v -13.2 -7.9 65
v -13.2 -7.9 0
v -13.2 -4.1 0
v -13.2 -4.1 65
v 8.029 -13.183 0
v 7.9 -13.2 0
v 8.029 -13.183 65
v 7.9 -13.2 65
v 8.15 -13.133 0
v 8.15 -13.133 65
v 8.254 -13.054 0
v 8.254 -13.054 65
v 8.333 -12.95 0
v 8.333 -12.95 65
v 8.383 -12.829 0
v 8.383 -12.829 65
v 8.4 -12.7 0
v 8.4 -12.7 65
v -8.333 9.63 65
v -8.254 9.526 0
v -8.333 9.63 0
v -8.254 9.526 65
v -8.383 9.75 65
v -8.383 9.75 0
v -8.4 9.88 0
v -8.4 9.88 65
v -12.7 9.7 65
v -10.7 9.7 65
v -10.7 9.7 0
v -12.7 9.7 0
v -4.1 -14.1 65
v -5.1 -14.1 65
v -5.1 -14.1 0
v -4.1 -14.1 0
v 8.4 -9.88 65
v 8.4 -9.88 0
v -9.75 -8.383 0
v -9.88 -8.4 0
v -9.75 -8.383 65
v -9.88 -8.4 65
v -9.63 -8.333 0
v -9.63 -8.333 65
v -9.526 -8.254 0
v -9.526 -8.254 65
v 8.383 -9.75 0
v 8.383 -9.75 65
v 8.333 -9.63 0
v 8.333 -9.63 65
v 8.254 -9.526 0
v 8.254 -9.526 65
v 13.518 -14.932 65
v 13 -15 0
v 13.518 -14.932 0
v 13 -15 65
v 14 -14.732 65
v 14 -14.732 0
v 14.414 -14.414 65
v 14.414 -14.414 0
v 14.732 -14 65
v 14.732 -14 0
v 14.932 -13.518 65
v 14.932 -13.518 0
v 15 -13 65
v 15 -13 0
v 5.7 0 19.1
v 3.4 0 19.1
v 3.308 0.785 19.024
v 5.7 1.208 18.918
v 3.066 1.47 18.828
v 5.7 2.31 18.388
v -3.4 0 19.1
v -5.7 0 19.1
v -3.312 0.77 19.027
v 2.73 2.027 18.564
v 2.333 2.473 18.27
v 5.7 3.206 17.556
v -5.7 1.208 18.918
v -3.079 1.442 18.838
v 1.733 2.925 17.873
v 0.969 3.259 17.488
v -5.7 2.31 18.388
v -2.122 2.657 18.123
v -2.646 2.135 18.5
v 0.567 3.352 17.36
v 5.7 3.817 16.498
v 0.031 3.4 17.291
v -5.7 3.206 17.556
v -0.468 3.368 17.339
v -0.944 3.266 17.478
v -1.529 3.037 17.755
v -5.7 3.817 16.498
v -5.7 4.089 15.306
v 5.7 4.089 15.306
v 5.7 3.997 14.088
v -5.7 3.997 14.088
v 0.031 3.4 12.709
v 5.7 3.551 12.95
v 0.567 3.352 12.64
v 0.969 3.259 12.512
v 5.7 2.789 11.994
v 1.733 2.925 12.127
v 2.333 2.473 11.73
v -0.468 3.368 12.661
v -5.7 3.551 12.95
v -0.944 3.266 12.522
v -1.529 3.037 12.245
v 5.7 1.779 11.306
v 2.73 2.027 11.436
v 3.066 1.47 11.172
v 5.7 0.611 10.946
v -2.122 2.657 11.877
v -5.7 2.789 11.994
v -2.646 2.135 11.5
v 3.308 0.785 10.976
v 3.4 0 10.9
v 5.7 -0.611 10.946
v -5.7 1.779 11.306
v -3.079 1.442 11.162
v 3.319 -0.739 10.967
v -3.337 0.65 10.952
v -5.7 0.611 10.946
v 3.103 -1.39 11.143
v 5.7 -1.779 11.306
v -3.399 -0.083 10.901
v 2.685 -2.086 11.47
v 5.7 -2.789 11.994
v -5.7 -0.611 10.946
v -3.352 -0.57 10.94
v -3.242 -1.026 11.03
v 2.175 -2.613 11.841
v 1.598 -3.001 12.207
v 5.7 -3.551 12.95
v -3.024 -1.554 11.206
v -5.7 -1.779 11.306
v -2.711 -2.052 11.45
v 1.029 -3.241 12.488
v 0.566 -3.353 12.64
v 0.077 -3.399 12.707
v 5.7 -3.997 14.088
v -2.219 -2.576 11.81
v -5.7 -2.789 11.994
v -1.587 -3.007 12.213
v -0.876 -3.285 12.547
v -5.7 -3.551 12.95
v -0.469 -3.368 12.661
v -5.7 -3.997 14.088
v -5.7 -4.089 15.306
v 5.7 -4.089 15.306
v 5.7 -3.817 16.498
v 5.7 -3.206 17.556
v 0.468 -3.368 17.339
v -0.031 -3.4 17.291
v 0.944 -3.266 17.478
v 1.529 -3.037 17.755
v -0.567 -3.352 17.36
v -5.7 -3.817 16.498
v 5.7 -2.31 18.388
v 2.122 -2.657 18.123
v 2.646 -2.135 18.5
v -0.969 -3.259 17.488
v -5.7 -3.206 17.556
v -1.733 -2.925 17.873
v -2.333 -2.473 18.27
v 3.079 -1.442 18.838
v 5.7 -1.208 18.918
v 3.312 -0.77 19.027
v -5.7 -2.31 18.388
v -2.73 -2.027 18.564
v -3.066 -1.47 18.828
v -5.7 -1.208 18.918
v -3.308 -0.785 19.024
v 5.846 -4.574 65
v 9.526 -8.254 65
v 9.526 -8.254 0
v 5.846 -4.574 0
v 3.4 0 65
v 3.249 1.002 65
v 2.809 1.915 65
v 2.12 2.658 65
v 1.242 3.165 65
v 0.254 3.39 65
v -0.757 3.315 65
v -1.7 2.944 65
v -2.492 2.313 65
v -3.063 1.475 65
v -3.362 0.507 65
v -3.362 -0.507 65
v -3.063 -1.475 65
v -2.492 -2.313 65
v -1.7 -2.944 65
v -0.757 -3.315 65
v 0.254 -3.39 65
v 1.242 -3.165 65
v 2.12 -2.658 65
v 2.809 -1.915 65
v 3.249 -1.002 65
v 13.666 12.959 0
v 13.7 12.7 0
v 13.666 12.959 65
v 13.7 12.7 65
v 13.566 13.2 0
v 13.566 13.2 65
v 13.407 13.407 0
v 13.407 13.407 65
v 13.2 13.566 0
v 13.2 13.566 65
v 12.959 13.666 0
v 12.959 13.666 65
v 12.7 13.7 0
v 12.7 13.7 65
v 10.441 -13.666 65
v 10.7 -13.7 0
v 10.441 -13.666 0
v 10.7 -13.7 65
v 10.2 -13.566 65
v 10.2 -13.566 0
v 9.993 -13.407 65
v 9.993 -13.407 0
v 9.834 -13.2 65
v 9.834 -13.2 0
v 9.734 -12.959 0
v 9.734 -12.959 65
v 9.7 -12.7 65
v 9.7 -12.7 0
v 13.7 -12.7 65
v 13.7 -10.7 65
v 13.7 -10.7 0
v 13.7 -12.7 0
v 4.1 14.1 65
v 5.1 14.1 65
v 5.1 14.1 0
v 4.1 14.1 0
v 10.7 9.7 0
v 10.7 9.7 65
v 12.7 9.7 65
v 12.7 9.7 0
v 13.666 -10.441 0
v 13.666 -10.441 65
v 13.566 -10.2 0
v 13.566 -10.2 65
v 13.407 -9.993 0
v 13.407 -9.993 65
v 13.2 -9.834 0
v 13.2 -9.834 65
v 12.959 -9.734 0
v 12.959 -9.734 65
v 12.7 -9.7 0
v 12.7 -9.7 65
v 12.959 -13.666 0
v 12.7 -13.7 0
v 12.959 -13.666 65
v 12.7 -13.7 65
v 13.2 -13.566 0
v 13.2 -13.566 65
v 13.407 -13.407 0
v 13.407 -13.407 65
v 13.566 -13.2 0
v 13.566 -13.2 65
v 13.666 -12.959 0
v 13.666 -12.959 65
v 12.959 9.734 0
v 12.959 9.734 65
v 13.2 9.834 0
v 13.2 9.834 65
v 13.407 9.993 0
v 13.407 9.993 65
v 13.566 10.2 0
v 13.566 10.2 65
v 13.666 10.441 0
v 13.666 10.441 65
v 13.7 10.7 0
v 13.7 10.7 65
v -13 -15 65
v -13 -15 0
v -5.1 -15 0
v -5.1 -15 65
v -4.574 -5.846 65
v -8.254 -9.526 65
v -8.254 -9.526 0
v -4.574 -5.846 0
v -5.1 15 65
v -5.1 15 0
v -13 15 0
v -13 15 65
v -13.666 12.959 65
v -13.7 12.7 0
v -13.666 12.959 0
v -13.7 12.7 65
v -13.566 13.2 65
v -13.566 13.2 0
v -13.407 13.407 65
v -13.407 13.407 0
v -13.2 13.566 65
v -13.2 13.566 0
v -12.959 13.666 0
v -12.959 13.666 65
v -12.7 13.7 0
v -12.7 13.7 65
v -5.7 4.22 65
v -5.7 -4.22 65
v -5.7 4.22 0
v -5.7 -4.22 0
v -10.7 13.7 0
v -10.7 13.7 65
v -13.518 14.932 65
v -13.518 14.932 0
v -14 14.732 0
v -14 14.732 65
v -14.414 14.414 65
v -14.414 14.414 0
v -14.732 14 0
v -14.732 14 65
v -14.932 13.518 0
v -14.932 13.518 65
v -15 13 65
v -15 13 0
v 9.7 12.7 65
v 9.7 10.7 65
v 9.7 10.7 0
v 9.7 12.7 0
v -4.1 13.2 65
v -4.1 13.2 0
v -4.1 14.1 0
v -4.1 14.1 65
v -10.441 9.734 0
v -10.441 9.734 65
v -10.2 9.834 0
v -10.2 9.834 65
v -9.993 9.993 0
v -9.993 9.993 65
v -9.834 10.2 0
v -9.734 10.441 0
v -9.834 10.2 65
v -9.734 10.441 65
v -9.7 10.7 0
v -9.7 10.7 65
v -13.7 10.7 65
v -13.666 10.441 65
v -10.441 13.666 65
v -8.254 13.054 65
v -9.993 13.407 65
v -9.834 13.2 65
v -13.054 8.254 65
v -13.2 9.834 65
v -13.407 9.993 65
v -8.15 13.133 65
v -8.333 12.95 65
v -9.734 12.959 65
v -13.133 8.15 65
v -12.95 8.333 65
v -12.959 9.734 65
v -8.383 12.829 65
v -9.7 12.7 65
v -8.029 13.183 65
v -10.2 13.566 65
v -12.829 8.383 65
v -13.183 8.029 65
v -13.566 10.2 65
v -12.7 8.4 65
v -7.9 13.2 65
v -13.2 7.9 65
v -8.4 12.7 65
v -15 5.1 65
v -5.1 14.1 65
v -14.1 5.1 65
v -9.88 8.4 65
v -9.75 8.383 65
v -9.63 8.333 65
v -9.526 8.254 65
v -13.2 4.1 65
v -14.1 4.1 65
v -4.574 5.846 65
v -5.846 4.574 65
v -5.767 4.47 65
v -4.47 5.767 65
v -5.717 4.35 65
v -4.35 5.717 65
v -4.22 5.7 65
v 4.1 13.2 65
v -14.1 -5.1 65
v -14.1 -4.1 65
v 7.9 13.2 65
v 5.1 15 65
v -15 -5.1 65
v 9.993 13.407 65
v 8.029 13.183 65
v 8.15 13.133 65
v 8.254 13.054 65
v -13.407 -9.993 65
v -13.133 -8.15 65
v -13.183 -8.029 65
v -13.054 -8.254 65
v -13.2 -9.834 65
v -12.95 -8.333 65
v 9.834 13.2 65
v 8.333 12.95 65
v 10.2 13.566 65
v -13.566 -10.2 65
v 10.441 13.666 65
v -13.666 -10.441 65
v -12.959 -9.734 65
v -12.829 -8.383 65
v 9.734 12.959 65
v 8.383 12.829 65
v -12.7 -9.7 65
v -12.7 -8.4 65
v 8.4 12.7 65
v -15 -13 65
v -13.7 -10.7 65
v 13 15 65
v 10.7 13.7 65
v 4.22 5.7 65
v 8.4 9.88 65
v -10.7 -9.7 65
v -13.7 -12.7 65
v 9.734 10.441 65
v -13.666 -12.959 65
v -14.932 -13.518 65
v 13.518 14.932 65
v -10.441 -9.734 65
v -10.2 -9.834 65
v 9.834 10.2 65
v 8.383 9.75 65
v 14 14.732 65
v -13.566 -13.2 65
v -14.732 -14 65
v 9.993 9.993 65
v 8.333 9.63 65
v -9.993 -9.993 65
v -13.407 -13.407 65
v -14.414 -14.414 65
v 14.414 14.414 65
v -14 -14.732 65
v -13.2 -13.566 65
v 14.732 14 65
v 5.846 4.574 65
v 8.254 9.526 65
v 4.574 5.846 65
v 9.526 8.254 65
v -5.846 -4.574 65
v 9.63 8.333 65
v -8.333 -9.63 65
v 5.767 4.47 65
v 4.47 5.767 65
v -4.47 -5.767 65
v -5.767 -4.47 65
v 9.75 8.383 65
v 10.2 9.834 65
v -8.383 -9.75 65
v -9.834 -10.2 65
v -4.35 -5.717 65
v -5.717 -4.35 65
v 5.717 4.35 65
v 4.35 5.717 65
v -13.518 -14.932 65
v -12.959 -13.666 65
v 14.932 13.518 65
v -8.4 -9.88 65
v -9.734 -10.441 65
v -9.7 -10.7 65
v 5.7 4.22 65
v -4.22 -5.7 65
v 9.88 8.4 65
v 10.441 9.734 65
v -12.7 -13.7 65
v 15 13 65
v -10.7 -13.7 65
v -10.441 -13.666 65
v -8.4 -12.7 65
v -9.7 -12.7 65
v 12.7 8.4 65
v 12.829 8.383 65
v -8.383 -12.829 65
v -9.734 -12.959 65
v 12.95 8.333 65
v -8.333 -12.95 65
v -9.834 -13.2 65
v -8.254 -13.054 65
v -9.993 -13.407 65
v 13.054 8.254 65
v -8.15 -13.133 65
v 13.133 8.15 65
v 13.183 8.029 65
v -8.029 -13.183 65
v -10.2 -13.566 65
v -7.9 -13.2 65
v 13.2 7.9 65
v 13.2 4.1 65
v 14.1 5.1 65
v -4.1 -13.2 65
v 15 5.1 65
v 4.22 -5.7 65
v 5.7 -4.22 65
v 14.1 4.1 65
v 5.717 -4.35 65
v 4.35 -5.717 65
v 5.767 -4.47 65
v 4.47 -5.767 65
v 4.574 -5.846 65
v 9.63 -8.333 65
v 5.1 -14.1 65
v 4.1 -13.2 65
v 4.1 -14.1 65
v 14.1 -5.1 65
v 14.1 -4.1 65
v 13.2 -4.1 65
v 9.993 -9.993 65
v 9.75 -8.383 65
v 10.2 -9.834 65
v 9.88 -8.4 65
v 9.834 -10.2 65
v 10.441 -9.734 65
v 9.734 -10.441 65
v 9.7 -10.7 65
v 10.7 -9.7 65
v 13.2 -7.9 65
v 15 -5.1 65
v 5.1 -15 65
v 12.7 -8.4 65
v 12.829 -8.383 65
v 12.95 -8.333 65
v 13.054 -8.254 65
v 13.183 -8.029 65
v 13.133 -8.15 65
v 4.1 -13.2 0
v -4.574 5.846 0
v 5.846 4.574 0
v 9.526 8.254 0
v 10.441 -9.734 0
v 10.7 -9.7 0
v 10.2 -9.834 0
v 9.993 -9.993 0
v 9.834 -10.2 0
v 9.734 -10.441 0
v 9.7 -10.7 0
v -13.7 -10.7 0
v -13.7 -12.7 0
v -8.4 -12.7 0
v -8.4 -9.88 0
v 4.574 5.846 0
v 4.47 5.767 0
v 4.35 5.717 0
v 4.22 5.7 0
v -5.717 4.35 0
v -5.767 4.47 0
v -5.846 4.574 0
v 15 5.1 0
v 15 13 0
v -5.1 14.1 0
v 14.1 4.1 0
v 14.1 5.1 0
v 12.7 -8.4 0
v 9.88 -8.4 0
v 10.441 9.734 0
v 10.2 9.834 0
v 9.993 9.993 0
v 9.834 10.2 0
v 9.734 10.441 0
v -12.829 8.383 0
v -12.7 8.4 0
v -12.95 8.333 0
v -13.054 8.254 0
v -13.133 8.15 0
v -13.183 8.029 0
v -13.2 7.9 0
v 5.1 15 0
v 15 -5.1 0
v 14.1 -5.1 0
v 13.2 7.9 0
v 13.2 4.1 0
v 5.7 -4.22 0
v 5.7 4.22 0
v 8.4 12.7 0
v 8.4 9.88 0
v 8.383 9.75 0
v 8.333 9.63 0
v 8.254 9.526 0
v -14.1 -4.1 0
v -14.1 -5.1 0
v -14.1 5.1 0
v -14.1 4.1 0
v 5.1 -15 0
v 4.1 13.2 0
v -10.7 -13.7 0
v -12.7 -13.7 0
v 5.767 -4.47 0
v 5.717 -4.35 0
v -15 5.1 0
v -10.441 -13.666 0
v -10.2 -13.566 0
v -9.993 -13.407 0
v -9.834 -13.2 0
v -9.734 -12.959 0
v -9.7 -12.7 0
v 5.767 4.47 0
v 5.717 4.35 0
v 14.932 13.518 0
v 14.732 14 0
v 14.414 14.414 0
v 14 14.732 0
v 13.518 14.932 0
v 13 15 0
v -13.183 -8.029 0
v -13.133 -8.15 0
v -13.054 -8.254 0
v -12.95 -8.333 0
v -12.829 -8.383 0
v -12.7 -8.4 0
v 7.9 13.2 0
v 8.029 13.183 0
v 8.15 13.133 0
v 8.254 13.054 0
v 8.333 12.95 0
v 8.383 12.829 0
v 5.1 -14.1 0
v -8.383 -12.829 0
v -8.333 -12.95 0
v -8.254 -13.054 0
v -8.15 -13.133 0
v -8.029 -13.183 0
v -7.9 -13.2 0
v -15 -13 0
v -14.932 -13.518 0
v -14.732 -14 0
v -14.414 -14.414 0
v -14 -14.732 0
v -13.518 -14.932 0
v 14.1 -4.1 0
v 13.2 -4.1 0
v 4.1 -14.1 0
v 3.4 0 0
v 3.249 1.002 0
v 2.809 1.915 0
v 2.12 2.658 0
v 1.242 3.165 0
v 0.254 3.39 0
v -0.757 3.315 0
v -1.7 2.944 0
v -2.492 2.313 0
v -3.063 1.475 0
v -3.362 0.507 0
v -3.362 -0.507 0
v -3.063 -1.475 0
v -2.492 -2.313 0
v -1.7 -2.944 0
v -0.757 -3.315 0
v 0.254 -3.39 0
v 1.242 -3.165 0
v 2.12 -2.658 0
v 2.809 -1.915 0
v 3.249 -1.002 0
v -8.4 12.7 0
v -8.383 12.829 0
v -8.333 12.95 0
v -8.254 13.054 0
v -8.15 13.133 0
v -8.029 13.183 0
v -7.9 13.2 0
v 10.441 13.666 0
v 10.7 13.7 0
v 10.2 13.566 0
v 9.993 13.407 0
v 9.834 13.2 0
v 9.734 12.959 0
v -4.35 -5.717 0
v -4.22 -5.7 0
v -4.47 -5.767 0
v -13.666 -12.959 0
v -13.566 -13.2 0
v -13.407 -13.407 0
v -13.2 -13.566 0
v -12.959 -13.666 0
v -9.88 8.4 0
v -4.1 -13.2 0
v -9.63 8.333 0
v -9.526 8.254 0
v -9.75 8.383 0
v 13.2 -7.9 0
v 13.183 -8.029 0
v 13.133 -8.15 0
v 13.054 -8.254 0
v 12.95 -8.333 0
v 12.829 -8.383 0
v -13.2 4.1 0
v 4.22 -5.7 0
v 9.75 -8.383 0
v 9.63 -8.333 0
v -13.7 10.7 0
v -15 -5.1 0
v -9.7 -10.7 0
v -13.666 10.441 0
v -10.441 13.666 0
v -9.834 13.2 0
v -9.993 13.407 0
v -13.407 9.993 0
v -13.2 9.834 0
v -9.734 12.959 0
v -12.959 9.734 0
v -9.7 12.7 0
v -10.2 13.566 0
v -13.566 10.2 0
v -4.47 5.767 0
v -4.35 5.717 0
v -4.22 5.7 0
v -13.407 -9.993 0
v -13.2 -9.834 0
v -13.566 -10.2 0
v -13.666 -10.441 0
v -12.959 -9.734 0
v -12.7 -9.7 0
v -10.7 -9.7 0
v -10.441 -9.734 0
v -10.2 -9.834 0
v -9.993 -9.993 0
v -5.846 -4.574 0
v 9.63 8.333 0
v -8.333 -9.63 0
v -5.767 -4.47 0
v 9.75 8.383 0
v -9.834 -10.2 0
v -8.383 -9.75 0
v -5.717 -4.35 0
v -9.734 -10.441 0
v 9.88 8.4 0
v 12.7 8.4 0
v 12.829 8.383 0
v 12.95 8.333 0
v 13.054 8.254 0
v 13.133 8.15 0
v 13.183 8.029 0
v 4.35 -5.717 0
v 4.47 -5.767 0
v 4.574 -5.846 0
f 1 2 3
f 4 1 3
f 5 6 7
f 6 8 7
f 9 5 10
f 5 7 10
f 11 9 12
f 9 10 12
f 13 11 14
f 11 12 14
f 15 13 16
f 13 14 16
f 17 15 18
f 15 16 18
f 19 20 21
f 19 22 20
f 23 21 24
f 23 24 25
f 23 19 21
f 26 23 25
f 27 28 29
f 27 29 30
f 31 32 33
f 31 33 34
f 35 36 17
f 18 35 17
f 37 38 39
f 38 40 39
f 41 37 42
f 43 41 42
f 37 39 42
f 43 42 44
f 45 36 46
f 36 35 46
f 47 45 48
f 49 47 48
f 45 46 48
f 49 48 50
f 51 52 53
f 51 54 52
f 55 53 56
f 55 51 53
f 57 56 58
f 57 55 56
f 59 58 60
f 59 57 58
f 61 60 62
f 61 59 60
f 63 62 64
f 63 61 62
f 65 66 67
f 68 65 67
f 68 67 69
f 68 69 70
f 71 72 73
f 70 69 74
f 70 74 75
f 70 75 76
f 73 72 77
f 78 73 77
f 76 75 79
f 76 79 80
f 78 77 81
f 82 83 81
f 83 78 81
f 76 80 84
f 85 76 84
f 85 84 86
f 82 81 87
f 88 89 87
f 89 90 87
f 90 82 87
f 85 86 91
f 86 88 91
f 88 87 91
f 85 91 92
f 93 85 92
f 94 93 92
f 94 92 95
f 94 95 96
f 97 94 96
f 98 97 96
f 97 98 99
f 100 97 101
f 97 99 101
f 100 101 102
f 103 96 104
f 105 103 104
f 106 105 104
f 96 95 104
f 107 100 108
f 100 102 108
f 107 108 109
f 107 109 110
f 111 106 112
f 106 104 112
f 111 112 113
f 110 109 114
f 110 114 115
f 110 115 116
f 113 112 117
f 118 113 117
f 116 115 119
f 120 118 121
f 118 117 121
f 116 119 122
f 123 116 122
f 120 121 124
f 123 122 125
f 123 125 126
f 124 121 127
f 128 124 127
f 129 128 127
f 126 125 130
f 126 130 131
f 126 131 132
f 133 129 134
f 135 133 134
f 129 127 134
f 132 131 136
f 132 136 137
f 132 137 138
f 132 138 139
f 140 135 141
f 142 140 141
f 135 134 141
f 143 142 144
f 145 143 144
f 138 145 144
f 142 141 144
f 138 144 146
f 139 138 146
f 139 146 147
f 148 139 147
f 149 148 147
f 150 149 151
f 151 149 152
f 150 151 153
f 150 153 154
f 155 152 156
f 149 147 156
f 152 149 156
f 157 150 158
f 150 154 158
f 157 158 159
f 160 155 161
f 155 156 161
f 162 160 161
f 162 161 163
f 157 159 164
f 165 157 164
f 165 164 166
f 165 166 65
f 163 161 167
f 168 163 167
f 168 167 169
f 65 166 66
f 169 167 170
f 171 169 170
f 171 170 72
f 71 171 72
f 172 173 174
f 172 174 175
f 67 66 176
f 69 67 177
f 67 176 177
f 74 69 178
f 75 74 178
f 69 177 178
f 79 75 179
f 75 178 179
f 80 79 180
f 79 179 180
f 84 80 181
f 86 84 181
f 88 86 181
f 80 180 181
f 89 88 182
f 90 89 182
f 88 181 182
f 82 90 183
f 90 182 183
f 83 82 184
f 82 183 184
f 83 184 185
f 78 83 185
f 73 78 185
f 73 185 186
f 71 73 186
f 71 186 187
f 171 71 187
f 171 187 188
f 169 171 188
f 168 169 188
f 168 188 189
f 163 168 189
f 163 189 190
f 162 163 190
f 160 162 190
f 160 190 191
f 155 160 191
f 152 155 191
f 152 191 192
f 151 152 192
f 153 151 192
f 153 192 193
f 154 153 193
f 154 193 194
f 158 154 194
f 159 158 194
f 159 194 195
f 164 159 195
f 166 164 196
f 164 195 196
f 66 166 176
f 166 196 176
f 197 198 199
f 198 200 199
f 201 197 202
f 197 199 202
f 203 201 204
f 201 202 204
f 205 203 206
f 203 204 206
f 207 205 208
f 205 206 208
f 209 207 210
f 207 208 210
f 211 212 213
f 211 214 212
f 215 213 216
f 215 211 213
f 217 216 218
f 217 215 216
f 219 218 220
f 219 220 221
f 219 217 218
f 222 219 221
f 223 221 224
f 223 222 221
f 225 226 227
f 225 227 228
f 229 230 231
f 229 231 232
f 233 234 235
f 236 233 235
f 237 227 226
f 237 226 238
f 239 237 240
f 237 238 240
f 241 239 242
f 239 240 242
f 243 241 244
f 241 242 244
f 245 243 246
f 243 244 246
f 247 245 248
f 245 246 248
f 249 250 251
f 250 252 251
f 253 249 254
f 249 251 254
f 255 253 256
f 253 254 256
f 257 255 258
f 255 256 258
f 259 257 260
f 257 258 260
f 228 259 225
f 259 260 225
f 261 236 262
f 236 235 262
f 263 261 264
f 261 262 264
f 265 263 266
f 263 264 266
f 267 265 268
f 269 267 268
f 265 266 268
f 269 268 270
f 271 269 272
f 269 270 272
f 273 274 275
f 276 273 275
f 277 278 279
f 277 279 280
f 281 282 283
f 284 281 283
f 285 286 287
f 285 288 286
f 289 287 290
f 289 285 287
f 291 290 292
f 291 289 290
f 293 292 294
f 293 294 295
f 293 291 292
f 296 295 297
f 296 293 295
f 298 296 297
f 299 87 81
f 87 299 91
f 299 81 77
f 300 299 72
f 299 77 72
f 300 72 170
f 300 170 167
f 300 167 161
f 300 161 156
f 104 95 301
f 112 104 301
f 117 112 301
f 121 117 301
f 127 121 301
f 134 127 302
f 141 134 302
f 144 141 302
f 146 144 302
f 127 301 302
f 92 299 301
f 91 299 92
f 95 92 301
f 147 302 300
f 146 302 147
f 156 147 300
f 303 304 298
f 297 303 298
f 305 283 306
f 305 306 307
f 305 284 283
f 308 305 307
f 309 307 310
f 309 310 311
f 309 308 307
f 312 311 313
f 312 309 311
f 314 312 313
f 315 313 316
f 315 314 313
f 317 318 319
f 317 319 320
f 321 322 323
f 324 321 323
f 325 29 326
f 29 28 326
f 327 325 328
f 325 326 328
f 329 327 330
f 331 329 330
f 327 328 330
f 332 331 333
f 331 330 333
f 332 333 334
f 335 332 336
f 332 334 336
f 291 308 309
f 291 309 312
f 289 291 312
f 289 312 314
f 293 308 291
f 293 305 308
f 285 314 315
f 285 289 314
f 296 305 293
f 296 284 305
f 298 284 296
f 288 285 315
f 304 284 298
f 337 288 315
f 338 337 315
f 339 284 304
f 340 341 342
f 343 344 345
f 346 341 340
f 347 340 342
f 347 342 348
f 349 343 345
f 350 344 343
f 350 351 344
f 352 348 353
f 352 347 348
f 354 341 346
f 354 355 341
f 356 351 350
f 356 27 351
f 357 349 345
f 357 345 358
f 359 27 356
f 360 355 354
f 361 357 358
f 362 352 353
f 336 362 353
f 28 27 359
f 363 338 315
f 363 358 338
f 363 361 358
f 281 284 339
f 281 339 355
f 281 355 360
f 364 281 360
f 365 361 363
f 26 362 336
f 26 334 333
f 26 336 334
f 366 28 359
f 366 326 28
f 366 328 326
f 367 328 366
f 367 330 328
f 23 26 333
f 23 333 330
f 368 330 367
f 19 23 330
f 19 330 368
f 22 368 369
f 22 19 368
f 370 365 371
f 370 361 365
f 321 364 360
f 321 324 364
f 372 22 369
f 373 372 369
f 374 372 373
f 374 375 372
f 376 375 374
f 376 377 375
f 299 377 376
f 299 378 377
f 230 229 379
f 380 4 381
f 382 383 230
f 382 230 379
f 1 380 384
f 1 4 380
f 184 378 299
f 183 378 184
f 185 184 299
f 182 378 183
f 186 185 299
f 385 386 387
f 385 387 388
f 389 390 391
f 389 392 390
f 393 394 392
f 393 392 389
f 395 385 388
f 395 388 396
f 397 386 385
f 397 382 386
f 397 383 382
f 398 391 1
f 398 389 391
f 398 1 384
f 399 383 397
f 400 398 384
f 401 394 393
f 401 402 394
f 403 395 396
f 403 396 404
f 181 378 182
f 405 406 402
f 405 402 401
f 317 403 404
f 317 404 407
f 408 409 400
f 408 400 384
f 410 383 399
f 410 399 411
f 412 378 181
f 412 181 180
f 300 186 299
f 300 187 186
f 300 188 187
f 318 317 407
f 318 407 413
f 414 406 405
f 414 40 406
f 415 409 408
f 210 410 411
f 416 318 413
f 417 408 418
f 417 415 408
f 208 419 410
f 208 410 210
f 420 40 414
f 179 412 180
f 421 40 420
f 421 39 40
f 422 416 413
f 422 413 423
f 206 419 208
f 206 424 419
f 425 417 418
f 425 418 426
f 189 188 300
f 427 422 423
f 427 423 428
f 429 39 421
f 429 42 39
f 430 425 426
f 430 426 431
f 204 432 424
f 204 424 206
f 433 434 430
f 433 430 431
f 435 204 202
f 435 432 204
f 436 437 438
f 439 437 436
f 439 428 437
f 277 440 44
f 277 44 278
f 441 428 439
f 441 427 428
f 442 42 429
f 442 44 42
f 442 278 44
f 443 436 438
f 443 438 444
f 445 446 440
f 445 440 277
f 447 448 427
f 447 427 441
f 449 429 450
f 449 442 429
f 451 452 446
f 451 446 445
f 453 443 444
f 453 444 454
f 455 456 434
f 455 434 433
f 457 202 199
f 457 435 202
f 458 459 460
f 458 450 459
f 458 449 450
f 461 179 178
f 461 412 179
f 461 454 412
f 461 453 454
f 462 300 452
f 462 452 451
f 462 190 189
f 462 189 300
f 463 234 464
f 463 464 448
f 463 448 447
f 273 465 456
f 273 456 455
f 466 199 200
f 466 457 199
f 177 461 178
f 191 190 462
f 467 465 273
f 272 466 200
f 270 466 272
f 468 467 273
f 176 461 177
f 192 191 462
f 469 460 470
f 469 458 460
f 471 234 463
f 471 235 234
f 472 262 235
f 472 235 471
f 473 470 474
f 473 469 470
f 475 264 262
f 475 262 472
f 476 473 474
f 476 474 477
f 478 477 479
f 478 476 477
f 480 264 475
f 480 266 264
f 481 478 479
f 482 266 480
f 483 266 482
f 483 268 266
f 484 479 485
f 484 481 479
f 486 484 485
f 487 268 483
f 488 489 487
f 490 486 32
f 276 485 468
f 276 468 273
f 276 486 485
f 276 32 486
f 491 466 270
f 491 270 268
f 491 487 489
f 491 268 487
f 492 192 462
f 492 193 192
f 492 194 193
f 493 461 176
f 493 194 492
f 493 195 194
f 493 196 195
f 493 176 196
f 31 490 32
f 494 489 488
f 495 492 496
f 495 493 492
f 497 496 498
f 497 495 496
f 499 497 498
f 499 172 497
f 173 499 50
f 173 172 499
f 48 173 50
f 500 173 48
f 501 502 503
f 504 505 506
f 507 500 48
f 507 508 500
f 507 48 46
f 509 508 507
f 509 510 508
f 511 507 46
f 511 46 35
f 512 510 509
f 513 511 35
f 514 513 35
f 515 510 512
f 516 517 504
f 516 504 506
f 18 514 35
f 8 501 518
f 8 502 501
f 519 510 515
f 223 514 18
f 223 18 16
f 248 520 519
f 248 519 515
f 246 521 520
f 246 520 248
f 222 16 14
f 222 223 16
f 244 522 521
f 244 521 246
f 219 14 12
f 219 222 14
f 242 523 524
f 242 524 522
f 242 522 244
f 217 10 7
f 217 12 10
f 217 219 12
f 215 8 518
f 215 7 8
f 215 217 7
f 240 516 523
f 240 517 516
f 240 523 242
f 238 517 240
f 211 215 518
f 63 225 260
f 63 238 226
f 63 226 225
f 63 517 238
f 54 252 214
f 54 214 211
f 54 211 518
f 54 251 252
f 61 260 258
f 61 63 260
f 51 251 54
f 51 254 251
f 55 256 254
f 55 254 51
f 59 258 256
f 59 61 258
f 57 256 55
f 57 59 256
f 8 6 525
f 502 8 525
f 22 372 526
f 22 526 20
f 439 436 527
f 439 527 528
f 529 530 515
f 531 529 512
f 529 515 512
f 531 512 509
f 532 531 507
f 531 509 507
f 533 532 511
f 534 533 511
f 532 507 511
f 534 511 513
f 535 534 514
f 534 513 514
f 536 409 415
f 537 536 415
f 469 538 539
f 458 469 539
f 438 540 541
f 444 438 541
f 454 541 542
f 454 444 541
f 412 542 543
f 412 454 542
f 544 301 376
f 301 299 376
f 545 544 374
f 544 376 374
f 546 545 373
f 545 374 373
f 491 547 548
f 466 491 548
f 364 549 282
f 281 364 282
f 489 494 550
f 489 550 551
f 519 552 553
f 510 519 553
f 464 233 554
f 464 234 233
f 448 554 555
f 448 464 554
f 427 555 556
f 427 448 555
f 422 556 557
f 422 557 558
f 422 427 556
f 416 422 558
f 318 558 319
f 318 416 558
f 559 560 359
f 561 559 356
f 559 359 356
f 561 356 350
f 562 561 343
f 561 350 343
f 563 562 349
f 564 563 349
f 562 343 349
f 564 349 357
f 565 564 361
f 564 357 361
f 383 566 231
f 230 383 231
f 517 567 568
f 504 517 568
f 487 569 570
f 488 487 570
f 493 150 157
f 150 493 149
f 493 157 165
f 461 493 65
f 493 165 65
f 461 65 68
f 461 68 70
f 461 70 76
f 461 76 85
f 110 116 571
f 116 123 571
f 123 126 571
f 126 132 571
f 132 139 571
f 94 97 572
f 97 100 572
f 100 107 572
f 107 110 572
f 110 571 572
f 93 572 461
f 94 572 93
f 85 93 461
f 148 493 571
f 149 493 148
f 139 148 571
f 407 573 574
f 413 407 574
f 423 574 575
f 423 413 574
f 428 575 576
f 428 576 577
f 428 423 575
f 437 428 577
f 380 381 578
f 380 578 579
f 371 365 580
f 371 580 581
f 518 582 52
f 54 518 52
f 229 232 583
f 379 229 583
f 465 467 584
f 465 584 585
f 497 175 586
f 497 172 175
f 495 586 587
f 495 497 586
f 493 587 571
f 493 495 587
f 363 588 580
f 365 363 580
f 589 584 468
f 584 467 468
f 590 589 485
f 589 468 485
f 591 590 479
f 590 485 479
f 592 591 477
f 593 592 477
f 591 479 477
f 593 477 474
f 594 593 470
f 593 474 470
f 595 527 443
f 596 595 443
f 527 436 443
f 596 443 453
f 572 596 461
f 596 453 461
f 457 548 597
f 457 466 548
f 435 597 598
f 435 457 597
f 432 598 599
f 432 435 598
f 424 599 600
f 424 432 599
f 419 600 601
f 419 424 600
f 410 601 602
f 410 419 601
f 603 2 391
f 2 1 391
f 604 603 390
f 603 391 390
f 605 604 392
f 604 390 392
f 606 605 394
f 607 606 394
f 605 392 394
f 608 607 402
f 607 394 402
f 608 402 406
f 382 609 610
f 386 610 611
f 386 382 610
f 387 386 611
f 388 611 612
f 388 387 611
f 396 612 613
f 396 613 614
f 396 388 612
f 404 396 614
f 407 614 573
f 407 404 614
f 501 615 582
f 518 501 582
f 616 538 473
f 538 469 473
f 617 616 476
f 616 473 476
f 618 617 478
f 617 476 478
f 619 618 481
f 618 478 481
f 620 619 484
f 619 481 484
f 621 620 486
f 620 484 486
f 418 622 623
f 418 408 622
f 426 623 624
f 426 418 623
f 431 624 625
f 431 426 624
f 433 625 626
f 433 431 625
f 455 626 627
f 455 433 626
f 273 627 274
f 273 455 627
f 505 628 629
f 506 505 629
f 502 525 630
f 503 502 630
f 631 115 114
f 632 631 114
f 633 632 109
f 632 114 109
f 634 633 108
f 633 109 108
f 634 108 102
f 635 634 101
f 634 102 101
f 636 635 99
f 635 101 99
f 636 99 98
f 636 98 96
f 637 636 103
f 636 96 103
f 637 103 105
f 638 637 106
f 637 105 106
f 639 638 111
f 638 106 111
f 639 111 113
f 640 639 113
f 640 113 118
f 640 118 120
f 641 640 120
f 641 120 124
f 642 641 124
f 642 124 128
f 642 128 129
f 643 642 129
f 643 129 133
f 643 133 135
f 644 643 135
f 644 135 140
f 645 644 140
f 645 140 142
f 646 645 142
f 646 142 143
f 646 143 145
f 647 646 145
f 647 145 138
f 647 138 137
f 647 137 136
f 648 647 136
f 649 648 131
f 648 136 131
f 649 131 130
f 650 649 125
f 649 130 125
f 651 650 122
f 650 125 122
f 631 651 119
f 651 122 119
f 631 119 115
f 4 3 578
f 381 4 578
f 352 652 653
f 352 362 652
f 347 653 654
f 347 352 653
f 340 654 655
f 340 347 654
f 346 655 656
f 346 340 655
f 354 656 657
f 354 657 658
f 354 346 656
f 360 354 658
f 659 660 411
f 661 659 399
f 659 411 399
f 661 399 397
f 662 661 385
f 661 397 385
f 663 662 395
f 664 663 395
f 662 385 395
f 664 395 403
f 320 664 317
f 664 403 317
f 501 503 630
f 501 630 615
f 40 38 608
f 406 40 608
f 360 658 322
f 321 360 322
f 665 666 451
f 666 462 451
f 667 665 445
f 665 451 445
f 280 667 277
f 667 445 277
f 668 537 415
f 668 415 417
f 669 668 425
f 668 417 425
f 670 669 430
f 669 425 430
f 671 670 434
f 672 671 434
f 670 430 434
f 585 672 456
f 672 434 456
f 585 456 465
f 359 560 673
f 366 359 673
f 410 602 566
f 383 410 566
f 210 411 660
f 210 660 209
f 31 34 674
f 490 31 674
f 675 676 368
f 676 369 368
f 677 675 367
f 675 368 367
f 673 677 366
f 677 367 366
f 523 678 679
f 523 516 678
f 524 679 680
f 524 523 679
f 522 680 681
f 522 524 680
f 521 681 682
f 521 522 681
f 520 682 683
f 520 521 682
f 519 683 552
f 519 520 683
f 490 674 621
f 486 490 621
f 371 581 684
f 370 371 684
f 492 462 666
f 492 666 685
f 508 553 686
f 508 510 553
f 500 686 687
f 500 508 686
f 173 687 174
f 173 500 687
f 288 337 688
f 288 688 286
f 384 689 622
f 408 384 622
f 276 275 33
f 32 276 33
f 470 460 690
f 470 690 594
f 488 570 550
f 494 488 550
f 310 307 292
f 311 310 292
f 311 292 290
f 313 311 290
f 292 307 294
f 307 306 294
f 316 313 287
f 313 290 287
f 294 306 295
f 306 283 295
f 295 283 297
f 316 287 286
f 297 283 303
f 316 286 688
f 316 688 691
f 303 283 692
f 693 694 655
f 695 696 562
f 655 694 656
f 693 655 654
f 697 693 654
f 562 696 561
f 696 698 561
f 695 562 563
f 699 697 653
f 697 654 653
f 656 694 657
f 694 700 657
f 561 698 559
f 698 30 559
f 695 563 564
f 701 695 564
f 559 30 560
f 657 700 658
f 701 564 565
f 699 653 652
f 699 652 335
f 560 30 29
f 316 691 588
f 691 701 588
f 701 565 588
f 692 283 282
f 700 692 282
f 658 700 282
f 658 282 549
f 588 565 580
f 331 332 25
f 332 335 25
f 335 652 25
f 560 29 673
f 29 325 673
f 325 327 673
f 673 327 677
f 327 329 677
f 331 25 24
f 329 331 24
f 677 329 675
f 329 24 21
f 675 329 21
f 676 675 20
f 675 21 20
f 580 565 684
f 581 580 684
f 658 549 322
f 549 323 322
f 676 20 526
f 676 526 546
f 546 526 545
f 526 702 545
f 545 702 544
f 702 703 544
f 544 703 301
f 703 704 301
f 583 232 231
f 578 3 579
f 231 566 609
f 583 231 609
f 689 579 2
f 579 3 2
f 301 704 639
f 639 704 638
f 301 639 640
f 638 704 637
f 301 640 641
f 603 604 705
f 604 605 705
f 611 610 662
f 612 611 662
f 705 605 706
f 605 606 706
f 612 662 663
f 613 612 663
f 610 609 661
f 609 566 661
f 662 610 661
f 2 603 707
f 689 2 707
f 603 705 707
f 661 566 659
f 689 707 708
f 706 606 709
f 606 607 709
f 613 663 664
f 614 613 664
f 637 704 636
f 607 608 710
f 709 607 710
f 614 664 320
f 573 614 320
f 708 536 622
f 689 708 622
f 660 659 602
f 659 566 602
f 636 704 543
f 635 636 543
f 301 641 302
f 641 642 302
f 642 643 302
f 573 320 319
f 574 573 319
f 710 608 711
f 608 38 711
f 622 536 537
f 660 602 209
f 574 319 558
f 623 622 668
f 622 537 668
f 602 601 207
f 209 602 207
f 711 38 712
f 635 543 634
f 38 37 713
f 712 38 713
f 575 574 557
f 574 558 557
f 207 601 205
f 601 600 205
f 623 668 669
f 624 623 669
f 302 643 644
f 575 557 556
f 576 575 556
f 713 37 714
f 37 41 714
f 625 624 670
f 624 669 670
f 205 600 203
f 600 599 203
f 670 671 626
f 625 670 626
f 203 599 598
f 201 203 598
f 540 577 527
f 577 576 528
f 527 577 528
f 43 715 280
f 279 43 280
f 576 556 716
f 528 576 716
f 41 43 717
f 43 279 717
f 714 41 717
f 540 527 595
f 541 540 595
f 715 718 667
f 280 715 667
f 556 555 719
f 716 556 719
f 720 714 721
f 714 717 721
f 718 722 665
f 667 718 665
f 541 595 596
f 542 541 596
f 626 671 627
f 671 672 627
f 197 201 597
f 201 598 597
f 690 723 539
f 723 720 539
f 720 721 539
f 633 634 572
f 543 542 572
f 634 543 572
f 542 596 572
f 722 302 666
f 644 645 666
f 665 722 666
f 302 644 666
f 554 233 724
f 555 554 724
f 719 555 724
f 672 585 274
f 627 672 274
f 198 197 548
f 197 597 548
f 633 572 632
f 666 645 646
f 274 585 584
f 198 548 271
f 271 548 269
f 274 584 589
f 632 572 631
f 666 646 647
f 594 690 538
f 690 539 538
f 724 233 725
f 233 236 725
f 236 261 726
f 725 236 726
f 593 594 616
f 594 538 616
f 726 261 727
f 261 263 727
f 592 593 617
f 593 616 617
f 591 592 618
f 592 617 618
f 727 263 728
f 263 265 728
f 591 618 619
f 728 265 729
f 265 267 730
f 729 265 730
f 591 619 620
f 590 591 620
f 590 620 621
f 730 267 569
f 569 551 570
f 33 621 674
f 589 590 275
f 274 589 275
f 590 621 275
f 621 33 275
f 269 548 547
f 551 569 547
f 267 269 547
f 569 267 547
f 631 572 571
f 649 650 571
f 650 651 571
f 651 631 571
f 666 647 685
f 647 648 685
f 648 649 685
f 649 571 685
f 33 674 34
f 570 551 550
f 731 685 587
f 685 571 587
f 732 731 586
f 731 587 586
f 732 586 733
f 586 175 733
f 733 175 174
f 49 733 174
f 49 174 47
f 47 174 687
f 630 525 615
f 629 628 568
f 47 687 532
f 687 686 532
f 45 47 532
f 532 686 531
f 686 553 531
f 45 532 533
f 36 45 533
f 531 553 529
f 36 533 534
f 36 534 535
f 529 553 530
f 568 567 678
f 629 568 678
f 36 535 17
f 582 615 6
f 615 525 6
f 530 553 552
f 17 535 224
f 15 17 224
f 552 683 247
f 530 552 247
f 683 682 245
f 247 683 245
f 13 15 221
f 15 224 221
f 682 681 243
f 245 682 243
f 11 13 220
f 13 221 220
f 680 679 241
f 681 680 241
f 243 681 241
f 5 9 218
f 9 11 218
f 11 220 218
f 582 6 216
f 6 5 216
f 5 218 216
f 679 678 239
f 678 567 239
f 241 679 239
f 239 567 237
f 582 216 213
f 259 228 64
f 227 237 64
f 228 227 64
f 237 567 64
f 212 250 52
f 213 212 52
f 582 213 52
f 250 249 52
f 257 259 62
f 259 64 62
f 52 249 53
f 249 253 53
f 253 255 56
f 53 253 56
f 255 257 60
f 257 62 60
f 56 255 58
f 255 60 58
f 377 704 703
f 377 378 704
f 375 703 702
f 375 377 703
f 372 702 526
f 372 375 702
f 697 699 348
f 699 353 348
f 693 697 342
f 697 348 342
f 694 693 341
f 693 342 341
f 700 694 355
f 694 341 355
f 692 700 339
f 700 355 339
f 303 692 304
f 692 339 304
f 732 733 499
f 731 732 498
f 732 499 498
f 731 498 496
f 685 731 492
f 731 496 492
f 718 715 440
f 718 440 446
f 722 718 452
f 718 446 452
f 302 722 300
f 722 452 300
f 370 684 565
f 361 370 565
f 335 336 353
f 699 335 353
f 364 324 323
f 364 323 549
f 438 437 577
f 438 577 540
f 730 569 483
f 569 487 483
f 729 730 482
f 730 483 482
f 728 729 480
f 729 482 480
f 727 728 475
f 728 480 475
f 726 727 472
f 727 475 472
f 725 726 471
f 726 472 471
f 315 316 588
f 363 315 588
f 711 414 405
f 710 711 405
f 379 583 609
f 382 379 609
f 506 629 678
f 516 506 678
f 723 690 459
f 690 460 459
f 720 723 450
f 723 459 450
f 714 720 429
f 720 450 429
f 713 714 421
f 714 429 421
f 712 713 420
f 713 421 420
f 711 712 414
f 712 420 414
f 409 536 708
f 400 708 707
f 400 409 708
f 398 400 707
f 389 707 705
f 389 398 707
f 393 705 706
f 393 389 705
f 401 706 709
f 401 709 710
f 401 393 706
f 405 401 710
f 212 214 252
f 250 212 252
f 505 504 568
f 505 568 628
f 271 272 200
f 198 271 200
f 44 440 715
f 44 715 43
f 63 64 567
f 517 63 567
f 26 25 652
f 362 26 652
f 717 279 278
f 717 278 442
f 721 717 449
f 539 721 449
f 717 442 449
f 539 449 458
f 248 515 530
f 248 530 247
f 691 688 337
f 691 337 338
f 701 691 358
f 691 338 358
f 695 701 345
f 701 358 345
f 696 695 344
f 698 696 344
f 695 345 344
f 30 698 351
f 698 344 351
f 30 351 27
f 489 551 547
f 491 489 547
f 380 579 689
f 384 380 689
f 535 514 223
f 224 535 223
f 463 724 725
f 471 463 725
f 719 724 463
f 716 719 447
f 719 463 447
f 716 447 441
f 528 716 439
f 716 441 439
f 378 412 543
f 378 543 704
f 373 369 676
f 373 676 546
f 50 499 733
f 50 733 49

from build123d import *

# Parameters (mm, degrees)
SKETCH_1_W                       = 4
SKETCH_1_H                       = 4
EXTRUDE_1_DEPTH                  = 65
FILLET_1_R                       = 1
FILLET_2_R                       = 2
FILLET_3_R                       = 0.5
PATTERN_CIRCULAR_1_COUNT         = 4
FILLET_1_OF_PATTERN_CIRCULAR_1_R = 1
FILLET_2_OF_PATTERN_CIRCULAR_1_R = 2
FILLET_3_OF_PATTERN_CIRCULAR_1_R = 0.5
SKETCH_2_R                       = 3.4
CUT_EXTRUDE_1_DEPTH              = 66
SKETCH_3_R                       = 4.1
CUT_EXTRUDE_2_DEPTH              = 21.7


with BuildPart() as part:
    # 草图1 → 凸台-拉伸1 (new body)
    with BuildSketch(Plane.XY):
        Polygon((5.7, 0), (5.7, 4.427207794), (9.672792206, 8.4), (13.2, 8.4), (13.2, 4.1), (14.1, 4.1), (14.1, 5.1), (15, 5.1), (15, 15), (5.1, 15), (5.1, 14.1), (4.1, 14.1), (4.1, 13.2), (8.4, 13.2), (8.4, 9.672792206), (4.427207794, 5.7), (0, 5.7), (0, 0), align=None)
        with Locations((11.7, 11.7)):
            Rectangle(SKETCH_1_W, SKETCH_1_H, mode=Mode.SUBTRACT)
    extrude_1 = extrude(amount=EXTRUDE_1_DEPTH)

    # 圆角1
    fillet_1_edges = [part.edges().sort_by_distance(p)[0] for p in [
        (13.7, 9.7, 32.5),
        (13.7, 13.7, 32.5),
        (9.7, 13.7, 32.5),
        (9.7, 9.7, 32.5),
    ]]
    fillet(fillet_1_edges, radius=FILLET_1_R)

    # 圆角2
    fillet_2_edges = [part.edges().sort_by_distance(p)[0] for p in [
        (15, 15, 32.5),
    ]]
    fillet(fillet_2_edges, radius=FILLET_2_R)

    # 圆角3
    fillet_3_edges = [part.edges().sort_by_distance(p)[0] for p in [
        (4.427207794, 5.7, 32.5),
        (8.4, 9.672792206, 32.5),
        (8.4, 13.2, 32.5),
        (13.2, 8.4, 32.5),
        (9.672792206, 8.4, 32.5),
        (5.7, 4.427207794, 32.5),
    ]]
    fillet(fillet_3_edges, radius=FILLET_3_R)

    # 阵列(圆周)1: 凸台-拉伸1 ×4 about axis
    pattern_circular_1_axis = Axis((0, 0, 0), (0, 0, 1))
    for i in range(1, PATTERN_CIRCULAR_1_COUNT):
        add(extrude_1.rotate(pattern_circular_1_axis, i * 360 / PATTERN_CIRCULAR_1_COUNT))

    # 圆角1 of 阵列(圆周)1
    fillet_1_of_pattern_circular_1_edges = [part.edges().sort_by_distance(p)[0] for p in [
        (-9.7, 13.7, 32.5),
        (-13.7, 13.7, 32.5),
        (-13.7, 9.7, 32.5),
        (-9.7, 9.7, 32.5),
        (-13.7, -9.7, 32.5),
        (-13.7, -13.7, 32.5),
        (-9.7, -13.7, 32.5),
        (-9.7, -9.7, 32.5),
        (9.7, -13.7, 32.5),
        (13.7, -13.7, 32.5),
        (13.7, -9.7, 32.5),
        (9.7, -9.7, 32.5),
    ]]
    fillet(fillet_1_of_pattern_circular_1_edges, radius=FILLET_1_OF_PATTERN_CIRCULAR_1_R)

    # 圆角2 of 阵列(圆周)1
    fillet_2_of_pattern_circular_1_edges = [part.edges().sort_by_distance(p)[0] for p in [
        (-15, 15, 32.5),
        (-15, -15, 32.5),
        (15, -15, 32.5),
    ]]
    fillet(fillet_2_of_pattern_circular_1_edges, radius=FILLET_2_OF_PATTERN_CIRCULAR_1_R)

    # 圆角3 of 阵列(圆周)1
    fillet_3_of_pattern_circular_1_edges = [part.edges().sort_by_distance(p)[0] for p in [
        (-5.7, 4.427207794, 32.5),
        (-9.672792206, 8.4, 32.5),
        (-13.2, 8.4, 32.5),
        (-8.4, 13.2, 32.5),
        (-8.4, 9.672792206, 32.5),
        (-4.427207794, 5.7, 32.5),
        (-4.427207794, -5.7, 32.5),
        (-8.4, -9.672792206, 32.5),
        (-8.4, -13.2, 32.5),
        (-13.2, -8.4, 32.5),
        (-9.672792206, -8.4, 32.5),
        (-5.7, -4.427207794, 32.5),
        (5.7, -4.427207794, 32.5),
        (9.672792206, -8.4, 32.5),
        (13.2, -8.4, 32.5),
        (8.4, -13.2, 32.5),
        (8.4, -9.672792206, 32.5),
        (4.427207794, -5.7, 32.5),
    ]]
    fillet(fillet_3_of_pattern_circular_1_edges, radius=FILLET_3_OF_PATTERN_CIRCULAR_1_R)

    # 草图2 → 切除-拉伸1 (cut, through all)
    with BuildSketch(Plane.XY.offset(65)):
        Circle(SKETCH_2_R)
    extrude(amount=-CUT_EXTRUDE_1_DEPTH, mode=Mode.SUBTRACT)

    # 草图3 → 切除-拉伸2 (cut, through all)
    with BuildSketch(Plane.ZY.offset(5.7)):
        with Locations((15, 0)):
            Circle(SKETCH_3_R)
    extrude(amount=-CUT_EXTRUDE_2_DEPTH, mode=Mode.SUBTRACT)


solid = part.part
